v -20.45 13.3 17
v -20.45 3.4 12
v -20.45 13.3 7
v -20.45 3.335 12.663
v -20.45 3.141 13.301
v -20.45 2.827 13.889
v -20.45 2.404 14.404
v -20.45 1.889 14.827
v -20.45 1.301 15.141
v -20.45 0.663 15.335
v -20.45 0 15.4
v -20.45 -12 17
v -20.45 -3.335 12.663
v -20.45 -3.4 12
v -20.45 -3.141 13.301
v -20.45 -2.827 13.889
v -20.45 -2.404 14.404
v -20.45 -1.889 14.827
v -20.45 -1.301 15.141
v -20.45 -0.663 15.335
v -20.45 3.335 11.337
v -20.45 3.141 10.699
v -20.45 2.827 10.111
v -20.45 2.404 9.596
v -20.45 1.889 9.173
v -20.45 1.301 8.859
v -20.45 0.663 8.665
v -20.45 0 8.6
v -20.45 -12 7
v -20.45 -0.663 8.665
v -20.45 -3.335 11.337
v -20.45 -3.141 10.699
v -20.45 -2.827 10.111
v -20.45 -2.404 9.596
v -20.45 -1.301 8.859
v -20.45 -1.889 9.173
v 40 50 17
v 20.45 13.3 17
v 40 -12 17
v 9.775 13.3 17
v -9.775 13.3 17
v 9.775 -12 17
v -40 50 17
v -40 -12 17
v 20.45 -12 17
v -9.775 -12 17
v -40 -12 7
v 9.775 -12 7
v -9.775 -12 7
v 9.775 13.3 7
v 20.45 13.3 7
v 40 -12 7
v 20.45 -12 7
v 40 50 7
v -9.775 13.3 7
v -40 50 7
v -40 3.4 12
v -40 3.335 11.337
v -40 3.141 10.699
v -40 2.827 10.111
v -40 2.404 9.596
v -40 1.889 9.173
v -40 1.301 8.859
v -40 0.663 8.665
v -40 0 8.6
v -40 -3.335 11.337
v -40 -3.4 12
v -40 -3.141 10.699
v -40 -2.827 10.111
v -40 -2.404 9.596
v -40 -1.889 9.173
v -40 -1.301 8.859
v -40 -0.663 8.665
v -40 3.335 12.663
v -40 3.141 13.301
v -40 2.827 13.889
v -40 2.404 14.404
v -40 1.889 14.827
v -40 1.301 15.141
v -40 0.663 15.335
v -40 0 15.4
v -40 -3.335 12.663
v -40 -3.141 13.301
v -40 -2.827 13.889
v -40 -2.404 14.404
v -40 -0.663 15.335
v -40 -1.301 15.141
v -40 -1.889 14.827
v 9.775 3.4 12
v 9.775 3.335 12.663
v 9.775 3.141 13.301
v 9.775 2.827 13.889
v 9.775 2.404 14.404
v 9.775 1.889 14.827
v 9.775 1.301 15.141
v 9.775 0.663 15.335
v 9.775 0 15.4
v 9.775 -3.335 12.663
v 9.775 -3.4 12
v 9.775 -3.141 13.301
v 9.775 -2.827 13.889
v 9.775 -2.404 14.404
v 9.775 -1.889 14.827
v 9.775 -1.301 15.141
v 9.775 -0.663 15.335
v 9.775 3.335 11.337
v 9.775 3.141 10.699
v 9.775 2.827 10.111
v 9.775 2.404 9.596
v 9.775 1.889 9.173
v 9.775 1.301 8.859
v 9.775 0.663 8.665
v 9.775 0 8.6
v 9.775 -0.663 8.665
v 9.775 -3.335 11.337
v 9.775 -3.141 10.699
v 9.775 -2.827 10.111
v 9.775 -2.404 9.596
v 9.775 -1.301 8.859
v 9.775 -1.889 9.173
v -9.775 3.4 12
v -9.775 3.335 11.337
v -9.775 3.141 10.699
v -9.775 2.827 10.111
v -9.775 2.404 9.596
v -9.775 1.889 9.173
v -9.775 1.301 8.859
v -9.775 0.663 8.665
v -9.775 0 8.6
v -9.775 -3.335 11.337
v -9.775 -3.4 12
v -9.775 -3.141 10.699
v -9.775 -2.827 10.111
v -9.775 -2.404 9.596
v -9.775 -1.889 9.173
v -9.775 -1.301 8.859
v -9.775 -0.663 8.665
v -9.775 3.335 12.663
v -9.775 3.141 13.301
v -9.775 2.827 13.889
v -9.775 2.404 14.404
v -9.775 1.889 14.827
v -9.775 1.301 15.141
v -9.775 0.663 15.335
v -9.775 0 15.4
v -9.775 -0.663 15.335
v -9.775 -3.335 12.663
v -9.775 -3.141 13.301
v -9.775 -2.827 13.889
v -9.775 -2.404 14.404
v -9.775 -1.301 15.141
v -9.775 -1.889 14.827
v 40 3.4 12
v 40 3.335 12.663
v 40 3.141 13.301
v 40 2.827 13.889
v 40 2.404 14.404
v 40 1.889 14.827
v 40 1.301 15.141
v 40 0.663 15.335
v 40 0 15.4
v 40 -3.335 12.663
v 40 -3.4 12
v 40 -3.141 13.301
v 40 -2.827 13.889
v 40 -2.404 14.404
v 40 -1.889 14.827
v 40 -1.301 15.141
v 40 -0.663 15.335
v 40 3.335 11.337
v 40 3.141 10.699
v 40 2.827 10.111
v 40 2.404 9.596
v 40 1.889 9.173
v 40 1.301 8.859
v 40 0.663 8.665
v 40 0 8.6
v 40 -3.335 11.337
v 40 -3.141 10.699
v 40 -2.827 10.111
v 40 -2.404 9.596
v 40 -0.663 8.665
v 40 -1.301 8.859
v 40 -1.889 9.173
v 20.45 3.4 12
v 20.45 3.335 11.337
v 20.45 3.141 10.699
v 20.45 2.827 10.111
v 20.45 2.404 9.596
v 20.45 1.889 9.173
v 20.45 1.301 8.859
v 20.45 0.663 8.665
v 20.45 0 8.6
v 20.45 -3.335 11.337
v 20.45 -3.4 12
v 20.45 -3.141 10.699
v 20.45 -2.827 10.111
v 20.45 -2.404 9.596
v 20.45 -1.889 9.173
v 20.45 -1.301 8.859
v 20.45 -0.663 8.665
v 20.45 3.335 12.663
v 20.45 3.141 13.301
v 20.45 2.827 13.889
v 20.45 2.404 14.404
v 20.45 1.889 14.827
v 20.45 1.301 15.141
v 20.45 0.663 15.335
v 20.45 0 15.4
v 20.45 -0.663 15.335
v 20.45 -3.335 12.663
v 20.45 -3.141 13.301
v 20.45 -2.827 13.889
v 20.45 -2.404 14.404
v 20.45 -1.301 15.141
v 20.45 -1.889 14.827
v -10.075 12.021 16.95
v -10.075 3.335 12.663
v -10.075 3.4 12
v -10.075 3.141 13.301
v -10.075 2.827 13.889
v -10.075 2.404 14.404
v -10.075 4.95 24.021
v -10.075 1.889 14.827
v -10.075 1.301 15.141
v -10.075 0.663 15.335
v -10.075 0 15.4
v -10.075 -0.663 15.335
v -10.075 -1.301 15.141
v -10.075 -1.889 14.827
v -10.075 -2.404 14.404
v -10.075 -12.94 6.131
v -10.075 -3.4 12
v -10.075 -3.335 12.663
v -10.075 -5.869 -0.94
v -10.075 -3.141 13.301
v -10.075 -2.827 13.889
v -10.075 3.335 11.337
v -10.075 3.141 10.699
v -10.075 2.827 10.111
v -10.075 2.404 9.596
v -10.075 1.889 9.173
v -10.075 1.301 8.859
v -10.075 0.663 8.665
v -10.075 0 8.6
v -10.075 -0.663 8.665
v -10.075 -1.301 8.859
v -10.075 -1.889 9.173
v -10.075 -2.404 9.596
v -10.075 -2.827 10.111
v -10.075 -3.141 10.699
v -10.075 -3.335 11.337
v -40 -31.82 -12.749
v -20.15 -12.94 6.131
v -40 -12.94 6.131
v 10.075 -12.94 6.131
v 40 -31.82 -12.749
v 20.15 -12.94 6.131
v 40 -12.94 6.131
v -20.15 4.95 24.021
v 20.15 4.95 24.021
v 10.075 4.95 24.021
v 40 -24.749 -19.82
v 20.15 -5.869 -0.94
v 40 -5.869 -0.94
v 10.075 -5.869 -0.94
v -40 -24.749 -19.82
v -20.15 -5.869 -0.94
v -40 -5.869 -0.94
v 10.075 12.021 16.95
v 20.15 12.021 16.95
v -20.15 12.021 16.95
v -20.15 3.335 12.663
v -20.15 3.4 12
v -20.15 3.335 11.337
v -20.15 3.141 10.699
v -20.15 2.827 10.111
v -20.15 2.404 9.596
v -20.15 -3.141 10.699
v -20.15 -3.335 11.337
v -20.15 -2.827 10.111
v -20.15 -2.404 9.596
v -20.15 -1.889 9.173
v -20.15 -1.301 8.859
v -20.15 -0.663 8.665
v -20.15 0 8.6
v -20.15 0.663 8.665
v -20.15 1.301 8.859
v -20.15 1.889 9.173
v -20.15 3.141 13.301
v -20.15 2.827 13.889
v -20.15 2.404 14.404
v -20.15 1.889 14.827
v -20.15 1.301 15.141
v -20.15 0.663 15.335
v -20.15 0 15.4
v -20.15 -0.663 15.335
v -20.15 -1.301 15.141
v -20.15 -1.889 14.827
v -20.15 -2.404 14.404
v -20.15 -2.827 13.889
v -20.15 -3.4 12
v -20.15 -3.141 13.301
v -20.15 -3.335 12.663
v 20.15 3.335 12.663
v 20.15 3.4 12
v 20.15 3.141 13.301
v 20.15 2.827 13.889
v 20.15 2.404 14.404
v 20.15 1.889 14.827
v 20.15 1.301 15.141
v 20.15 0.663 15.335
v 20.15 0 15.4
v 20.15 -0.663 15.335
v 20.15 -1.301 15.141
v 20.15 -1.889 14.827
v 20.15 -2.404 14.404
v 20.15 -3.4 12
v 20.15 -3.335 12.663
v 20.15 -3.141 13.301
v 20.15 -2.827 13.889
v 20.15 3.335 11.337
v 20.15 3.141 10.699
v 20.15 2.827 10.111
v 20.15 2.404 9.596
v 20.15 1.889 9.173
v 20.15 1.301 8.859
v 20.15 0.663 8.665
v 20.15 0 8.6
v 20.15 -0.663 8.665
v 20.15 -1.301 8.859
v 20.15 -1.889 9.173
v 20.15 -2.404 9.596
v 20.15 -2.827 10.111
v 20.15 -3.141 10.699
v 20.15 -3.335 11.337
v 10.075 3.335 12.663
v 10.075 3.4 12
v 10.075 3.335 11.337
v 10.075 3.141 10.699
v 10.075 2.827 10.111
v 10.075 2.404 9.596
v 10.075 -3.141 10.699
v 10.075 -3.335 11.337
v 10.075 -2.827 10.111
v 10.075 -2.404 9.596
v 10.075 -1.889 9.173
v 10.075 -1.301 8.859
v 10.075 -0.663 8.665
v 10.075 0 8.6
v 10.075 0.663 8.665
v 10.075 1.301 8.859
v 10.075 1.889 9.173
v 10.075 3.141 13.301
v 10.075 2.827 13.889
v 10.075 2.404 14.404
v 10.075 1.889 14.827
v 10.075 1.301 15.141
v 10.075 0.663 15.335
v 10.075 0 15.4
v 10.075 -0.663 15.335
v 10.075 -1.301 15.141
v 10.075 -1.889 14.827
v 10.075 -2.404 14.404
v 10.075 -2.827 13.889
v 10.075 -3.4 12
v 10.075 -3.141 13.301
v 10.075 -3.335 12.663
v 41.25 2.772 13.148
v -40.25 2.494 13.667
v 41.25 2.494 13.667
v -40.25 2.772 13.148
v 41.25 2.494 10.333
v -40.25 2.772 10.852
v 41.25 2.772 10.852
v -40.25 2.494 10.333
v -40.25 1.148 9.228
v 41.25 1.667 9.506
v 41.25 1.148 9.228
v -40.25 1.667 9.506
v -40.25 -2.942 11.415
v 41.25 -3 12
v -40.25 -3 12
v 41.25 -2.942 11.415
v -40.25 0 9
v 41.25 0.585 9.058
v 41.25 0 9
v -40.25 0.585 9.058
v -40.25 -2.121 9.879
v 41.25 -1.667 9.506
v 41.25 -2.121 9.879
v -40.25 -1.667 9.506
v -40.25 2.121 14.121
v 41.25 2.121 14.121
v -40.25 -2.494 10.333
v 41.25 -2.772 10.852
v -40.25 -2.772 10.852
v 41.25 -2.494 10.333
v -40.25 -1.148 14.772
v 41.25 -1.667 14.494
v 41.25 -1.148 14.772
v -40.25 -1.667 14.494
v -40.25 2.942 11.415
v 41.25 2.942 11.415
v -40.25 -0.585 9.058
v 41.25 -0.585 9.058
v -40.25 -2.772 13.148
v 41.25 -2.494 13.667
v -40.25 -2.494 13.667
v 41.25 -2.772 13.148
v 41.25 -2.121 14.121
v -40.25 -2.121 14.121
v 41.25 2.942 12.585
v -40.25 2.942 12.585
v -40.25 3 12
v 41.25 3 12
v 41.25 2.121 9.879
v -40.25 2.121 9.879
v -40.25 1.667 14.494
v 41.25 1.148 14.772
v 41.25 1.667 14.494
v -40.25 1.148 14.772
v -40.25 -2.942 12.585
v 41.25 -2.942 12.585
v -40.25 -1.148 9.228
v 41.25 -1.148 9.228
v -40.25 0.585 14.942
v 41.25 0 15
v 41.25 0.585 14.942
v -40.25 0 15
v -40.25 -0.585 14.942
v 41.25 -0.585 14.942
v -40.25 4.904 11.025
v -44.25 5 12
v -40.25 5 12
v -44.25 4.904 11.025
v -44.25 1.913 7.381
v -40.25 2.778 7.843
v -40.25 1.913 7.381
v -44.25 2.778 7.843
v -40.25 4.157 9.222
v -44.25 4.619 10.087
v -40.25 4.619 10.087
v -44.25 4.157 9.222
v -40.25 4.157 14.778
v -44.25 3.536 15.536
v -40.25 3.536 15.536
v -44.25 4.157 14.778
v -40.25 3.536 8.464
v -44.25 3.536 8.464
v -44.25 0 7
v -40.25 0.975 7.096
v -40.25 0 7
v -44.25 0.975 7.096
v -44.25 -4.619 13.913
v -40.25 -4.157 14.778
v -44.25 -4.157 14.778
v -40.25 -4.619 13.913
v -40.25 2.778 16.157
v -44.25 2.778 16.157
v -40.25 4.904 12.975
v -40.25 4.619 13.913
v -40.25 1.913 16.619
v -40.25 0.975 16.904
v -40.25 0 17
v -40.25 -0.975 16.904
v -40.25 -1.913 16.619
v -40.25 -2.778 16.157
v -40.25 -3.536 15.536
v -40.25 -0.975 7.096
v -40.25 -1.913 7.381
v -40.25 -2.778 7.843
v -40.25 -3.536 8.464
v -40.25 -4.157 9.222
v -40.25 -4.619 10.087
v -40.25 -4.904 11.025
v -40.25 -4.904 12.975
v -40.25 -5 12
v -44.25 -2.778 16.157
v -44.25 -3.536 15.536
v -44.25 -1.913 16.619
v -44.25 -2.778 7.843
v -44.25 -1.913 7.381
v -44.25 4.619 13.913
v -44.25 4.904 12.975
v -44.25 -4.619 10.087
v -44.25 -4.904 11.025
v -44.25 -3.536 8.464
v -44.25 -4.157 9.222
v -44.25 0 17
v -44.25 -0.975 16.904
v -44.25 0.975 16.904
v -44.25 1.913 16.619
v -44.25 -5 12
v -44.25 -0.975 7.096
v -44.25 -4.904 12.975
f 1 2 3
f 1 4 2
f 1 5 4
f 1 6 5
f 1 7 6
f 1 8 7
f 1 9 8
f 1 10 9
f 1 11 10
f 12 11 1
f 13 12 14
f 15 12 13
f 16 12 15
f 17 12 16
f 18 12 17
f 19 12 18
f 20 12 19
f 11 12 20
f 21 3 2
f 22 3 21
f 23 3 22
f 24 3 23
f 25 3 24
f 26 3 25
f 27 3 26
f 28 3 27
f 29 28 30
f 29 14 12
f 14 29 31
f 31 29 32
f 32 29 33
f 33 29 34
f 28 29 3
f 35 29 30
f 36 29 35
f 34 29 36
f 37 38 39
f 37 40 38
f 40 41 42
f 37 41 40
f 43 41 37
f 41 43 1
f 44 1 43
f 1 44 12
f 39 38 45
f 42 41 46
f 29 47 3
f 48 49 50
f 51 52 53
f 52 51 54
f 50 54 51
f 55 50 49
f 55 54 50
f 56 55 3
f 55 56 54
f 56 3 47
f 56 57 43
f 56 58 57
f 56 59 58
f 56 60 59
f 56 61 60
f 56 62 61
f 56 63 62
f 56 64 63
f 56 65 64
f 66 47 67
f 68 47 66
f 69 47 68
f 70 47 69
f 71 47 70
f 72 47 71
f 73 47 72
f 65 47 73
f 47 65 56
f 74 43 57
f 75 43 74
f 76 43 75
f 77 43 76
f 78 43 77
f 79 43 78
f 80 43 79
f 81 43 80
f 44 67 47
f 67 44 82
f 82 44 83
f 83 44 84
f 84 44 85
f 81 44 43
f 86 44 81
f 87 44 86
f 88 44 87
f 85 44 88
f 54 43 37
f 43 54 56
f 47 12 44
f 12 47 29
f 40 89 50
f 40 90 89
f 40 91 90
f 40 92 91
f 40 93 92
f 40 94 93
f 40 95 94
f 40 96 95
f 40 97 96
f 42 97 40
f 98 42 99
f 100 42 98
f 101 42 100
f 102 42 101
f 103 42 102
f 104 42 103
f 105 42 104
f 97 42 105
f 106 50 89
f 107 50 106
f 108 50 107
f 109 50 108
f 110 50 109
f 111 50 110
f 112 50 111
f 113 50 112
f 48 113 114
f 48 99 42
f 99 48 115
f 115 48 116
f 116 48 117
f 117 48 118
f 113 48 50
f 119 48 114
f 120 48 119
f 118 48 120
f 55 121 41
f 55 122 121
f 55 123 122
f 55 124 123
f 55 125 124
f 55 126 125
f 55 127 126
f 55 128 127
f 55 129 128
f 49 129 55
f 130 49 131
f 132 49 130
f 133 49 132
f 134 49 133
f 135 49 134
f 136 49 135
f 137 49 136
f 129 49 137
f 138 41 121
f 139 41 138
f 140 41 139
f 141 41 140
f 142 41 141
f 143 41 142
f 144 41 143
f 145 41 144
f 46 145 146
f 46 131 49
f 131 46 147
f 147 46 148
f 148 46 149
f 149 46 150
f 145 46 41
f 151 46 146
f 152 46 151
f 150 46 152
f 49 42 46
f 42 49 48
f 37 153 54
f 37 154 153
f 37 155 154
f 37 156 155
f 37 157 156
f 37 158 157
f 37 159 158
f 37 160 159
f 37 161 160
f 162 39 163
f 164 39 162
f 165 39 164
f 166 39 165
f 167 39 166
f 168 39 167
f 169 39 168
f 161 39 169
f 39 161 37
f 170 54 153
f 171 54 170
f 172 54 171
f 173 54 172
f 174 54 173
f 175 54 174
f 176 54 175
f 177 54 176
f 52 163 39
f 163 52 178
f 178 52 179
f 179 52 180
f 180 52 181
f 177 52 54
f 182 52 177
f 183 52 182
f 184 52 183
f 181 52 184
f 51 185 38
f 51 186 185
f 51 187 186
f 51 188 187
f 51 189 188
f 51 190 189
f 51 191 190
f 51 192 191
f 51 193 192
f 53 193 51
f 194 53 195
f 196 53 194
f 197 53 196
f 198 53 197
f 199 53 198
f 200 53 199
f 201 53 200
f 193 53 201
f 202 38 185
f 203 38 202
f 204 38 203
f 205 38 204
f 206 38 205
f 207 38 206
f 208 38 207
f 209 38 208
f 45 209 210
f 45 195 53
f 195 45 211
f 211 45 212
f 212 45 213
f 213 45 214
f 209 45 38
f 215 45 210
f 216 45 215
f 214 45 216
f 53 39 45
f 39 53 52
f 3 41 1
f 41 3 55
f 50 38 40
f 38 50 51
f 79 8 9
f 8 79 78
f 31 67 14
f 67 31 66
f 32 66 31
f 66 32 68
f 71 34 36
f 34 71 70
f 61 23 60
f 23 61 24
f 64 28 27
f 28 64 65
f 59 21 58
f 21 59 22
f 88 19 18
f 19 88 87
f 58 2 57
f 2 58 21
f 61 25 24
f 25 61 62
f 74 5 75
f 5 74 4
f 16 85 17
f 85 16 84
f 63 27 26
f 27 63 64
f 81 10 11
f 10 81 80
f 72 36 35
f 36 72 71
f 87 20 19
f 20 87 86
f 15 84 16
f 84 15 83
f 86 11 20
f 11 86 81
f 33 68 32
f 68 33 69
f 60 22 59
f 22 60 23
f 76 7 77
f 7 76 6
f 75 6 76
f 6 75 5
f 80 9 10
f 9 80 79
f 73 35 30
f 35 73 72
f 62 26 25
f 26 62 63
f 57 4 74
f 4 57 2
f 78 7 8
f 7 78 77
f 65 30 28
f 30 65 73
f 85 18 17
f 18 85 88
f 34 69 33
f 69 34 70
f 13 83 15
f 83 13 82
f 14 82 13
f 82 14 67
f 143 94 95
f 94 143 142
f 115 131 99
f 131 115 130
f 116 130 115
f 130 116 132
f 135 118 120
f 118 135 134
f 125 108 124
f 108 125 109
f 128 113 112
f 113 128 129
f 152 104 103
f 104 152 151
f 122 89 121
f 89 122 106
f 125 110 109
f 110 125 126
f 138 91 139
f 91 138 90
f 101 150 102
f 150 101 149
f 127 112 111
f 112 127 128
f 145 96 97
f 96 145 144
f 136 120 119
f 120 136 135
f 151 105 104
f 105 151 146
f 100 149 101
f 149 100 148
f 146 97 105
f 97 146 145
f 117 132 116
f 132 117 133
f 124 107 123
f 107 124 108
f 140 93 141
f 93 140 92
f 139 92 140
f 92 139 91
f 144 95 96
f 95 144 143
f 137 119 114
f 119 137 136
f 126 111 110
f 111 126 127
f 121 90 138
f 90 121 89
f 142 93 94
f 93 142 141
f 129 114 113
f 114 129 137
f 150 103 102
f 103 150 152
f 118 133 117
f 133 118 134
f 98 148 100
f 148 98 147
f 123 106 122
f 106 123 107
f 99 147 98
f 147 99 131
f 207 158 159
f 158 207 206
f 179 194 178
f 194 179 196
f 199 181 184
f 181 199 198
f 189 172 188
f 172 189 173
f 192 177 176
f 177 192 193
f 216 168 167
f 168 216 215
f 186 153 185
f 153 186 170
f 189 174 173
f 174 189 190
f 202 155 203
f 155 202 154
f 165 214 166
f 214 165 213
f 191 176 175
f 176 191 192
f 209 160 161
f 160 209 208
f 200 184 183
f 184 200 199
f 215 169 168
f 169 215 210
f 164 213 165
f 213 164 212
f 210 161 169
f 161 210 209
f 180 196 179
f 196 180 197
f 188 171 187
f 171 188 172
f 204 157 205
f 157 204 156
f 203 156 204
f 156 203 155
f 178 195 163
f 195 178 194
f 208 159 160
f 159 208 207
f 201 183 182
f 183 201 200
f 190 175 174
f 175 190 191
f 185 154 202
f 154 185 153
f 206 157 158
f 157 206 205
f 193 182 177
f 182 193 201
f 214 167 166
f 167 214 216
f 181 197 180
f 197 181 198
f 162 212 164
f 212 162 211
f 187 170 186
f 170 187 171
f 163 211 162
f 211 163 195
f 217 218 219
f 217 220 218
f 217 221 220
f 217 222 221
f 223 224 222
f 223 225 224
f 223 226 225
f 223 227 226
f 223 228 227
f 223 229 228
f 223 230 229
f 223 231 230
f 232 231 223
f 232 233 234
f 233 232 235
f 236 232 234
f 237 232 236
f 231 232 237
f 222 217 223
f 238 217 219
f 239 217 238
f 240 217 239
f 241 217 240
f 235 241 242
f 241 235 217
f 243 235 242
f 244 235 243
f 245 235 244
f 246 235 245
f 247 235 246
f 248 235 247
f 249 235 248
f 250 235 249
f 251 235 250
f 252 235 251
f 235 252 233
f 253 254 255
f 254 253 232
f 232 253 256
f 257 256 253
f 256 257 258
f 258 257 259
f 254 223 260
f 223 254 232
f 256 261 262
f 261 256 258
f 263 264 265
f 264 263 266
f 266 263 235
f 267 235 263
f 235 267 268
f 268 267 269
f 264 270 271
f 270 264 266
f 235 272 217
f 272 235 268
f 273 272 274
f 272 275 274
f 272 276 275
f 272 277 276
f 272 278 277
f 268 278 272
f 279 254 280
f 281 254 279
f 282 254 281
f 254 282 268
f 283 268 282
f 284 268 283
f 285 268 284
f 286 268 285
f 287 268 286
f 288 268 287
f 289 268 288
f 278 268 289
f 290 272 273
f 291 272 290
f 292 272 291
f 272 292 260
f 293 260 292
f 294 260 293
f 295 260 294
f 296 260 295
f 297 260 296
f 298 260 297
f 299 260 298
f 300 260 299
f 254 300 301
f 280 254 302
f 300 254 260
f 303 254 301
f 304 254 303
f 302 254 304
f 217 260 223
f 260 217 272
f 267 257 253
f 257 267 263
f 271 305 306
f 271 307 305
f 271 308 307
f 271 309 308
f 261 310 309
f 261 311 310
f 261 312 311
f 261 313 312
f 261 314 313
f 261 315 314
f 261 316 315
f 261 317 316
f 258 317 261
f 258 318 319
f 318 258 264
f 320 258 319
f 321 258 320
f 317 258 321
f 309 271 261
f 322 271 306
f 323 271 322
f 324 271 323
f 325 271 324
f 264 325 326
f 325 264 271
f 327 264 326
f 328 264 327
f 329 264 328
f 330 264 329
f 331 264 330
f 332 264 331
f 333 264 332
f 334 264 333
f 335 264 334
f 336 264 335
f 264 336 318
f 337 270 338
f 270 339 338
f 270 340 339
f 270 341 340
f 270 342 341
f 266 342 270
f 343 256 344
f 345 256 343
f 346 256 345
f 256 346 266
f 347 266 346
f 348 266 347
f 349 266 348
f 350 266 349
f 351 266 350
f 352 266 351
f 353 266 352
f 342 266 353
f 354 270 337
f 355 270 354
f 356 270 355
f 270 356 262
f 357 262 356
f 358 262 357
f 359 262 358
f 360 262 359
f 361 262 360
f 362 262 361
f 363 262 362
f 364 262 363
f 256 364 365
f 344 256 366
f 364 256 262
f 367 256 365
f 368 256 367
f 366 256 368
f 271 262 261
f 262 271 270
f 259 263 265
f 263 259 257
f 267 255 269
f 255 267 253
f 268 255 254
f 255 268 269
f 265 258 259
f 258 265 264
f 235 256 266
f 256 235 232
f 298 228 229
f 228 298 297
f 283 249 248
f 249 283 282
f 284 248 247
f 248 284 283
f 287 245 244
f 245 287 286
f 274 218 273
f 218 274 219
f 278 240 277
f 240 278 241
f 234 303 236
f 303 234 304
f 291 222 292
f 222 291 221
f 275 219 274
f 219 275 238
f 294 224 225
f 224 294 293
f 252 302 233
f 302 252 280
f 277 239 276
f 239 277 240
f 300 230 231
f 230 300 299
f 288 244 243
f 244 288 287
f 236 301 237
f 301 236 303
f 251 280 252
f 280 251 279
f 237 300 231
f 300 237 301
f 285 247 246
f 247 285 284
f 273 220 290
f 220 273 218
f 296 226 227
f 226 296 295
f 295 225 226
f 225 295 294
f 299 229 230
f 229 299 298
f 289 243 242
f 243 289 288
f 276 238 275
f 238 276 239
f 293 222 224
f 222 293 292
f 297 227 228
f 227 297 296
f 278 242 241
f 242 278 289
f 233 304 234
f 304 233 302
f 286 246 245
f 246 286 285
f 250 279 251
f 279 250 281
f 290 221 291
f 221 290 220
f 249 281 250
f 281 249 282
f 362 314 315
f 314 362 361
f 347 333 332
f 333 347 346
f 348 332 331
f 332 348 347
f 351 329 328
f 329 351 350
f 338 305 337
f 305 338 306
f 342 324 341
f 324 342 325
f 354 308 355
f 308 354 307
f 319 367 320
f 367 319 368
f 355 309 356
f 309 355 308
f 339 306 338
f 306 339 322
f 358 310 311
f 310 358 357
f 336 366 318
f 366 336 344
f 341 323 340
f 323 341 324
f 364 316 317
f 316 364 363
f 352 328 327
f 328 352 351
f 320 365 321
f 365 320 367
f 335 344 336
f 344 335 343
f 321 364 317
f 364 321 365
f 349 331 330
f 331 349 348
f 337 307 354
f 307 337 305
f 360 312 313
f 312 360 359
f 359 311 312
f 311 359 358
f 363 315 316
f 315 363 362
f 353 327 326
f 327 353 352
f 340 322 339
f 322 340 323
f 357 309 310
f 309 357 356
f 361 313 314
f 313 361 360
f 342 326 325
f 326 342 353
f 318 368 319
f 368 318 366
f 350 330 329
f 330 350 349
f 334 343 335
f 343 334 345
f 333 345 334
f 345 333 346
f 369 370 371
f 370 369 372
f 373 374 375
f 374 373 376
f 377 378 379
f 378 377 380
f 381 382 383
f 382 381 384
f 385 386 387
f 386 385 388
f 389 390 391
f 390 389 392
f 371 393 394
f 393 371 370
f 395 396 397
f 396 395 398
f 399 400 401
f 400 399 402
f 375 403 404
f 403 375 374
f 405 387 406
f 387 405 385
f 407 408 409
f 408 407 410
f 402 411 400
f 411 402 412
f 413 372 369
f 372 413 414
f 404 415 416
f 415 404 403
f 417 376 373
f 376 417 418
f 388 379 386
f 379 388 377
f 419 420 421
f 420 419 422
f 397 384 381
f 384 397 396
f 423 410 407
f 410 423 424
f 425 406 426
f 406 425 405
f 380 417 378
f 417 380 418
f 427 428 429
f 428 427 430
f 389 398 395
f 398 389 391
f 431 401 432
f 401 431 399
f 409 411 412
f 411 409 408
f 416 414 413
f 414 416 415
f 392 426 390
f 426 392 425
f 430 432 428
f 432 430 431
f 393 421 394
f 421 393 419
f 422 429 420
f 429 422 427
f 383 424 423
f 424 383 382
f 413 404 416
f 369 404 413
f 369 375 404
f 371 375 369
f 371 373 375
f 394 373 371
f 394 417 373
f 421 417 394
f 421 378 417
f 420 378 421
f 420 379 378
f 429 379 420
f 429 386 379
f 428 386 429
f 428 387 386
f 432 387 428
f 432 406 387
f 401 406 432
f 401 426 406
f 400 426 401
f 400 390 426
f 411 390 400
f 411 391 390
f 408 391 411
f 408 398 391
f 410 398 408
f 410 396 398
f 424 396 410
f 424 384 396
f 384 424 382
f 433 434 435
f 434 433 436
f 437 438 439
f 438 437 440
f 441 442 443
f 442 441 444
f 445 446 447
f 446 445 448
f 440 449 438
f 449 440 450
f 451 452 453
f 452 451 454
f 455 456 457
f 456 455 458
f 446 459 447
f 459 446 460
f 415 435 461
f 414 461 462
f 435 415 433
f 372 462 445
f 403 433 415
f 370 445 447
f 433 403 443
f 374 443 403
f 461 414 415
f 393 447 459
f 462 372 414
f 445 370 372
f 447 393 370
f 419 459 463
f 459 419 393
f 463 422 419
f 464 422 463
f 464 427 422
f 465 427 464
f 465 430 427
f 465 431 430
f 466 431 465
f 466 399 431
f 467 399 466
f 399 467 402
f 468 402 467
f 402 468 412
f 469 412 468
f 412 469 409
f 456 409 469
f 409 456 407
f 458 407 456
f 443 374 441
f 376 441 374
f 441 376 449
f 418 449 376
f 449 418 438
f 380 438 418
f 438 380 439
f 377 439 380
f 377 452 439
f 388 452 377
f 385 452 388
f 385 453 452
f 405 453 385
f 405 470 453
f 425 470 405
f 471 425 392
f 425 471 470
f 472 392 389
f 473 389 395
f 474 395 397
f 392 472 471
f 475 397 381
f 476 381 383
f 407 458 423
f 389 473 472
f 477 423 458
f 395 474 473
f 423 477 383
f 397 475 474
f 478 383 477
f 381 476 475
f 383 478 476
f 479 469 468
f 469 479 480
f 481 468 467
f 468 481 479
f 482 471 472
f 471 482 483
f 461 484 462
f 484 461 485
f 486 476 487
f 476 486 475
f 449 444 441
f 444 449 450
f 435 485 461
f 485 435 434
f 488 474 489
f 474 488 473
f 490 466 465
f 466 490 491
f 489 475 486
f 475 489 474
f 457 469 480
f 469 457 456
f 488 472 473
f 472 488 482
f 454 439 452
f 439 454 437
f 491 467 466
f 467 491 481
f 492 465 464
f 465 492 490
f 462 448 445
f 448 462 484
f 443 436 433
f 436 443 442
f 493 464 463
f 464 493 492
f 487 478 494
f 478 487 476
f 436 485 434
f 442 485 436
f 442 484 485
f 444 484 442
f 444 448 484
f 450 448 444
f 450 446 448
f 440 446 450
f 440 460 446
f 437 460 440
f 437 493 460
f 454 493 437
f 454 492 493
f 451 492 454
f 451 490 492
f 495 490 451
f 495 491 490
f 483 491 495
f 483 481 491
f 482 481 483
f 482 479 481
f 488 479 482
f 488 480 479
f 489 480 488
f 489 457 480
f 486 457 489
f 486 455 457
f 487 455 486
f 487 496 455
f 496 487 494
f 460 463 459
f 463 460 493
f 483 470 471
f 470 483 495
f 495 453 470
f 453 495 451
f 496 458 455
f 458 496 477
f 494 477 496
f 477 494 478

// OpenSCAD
$fn = 32;

// ------------------------------------------------------------------------
// Butt hinge: hinge 80 mm, leaf swung 45 deg
// Every part is its own module, assembly() places every instance.
// ------------------------------------------------------------------------

// --- part 1 ---
module hinge_base() {
  difference() {
    union() {
      translate([-40, -12, -5]) cube([19.55, 62, 10]);
      translate([-9.775, -12, -5]) cube([19.55, 62, 10]);
      translate([20.45, -12, -5]) cube([19.55, 62, 10]);
      translate([-40, 13.3, -5]) cube([80, 36.7, 10]);
    }
    translate([-30.225, 0, 0]) rotate([0, 90, 0]) cylinder(h = 21.55, d = 6.8, center = true);
    translate([0, 0, 0]) rotate([0, 90, 0]) cylinder(h = 21.55, d = 6.8, center = true);
    translate([30.225, 0, 0]) rotate([0, 90, 0]) cylinder(h = 21.55, d = 6.8, center = true);
  }
}

// --- part 2 ---
module hinge_mover() {
  difference() {
    union() {
      translate([-20.15, -40, -5]) cube([10.075, 52, 10]);
      translate([10.075, -40, -5]) cube([10.075, 52, 10]);
      translate([-40, -40, -5]) cube([80, 26.7, 10]);
    }
    translate([-15.113, 0, 0]) rotate([0, 90, 0]) cylinder(h = 12.075, d = 6.8, center = true);
    translate([15.113, 0, 0]) rotate([0, 90, 0]) cylinder(h = 12.075, d = 6.8, center = true);
  }
}

// --- part 3 ---
module hinge_pin() {
  rotate([0, 90, 0]) cylinder(h = 82.5, d = 6, center = true);
  translate([-44.25, 0, 0]) rotate([0, 90, 0]) cylinder(h = 4, d = 10);
}

// --- assembly ---
module assembly() {
  color([0.80, 0.24, 0.20]) translate([0, 0, 12]) rotate([0, 0, 0]) hinge_base();
  color([0.20, 0.45, 0.75]) translate([0, 0, 12]) rotate([45, 0, 0]) hinge_mover();
  color([0.25, 0.62, 0.32]) translate([0, 0, 12]) rotate([0, 0, 0]) hinge_pin();
}

assembly();
